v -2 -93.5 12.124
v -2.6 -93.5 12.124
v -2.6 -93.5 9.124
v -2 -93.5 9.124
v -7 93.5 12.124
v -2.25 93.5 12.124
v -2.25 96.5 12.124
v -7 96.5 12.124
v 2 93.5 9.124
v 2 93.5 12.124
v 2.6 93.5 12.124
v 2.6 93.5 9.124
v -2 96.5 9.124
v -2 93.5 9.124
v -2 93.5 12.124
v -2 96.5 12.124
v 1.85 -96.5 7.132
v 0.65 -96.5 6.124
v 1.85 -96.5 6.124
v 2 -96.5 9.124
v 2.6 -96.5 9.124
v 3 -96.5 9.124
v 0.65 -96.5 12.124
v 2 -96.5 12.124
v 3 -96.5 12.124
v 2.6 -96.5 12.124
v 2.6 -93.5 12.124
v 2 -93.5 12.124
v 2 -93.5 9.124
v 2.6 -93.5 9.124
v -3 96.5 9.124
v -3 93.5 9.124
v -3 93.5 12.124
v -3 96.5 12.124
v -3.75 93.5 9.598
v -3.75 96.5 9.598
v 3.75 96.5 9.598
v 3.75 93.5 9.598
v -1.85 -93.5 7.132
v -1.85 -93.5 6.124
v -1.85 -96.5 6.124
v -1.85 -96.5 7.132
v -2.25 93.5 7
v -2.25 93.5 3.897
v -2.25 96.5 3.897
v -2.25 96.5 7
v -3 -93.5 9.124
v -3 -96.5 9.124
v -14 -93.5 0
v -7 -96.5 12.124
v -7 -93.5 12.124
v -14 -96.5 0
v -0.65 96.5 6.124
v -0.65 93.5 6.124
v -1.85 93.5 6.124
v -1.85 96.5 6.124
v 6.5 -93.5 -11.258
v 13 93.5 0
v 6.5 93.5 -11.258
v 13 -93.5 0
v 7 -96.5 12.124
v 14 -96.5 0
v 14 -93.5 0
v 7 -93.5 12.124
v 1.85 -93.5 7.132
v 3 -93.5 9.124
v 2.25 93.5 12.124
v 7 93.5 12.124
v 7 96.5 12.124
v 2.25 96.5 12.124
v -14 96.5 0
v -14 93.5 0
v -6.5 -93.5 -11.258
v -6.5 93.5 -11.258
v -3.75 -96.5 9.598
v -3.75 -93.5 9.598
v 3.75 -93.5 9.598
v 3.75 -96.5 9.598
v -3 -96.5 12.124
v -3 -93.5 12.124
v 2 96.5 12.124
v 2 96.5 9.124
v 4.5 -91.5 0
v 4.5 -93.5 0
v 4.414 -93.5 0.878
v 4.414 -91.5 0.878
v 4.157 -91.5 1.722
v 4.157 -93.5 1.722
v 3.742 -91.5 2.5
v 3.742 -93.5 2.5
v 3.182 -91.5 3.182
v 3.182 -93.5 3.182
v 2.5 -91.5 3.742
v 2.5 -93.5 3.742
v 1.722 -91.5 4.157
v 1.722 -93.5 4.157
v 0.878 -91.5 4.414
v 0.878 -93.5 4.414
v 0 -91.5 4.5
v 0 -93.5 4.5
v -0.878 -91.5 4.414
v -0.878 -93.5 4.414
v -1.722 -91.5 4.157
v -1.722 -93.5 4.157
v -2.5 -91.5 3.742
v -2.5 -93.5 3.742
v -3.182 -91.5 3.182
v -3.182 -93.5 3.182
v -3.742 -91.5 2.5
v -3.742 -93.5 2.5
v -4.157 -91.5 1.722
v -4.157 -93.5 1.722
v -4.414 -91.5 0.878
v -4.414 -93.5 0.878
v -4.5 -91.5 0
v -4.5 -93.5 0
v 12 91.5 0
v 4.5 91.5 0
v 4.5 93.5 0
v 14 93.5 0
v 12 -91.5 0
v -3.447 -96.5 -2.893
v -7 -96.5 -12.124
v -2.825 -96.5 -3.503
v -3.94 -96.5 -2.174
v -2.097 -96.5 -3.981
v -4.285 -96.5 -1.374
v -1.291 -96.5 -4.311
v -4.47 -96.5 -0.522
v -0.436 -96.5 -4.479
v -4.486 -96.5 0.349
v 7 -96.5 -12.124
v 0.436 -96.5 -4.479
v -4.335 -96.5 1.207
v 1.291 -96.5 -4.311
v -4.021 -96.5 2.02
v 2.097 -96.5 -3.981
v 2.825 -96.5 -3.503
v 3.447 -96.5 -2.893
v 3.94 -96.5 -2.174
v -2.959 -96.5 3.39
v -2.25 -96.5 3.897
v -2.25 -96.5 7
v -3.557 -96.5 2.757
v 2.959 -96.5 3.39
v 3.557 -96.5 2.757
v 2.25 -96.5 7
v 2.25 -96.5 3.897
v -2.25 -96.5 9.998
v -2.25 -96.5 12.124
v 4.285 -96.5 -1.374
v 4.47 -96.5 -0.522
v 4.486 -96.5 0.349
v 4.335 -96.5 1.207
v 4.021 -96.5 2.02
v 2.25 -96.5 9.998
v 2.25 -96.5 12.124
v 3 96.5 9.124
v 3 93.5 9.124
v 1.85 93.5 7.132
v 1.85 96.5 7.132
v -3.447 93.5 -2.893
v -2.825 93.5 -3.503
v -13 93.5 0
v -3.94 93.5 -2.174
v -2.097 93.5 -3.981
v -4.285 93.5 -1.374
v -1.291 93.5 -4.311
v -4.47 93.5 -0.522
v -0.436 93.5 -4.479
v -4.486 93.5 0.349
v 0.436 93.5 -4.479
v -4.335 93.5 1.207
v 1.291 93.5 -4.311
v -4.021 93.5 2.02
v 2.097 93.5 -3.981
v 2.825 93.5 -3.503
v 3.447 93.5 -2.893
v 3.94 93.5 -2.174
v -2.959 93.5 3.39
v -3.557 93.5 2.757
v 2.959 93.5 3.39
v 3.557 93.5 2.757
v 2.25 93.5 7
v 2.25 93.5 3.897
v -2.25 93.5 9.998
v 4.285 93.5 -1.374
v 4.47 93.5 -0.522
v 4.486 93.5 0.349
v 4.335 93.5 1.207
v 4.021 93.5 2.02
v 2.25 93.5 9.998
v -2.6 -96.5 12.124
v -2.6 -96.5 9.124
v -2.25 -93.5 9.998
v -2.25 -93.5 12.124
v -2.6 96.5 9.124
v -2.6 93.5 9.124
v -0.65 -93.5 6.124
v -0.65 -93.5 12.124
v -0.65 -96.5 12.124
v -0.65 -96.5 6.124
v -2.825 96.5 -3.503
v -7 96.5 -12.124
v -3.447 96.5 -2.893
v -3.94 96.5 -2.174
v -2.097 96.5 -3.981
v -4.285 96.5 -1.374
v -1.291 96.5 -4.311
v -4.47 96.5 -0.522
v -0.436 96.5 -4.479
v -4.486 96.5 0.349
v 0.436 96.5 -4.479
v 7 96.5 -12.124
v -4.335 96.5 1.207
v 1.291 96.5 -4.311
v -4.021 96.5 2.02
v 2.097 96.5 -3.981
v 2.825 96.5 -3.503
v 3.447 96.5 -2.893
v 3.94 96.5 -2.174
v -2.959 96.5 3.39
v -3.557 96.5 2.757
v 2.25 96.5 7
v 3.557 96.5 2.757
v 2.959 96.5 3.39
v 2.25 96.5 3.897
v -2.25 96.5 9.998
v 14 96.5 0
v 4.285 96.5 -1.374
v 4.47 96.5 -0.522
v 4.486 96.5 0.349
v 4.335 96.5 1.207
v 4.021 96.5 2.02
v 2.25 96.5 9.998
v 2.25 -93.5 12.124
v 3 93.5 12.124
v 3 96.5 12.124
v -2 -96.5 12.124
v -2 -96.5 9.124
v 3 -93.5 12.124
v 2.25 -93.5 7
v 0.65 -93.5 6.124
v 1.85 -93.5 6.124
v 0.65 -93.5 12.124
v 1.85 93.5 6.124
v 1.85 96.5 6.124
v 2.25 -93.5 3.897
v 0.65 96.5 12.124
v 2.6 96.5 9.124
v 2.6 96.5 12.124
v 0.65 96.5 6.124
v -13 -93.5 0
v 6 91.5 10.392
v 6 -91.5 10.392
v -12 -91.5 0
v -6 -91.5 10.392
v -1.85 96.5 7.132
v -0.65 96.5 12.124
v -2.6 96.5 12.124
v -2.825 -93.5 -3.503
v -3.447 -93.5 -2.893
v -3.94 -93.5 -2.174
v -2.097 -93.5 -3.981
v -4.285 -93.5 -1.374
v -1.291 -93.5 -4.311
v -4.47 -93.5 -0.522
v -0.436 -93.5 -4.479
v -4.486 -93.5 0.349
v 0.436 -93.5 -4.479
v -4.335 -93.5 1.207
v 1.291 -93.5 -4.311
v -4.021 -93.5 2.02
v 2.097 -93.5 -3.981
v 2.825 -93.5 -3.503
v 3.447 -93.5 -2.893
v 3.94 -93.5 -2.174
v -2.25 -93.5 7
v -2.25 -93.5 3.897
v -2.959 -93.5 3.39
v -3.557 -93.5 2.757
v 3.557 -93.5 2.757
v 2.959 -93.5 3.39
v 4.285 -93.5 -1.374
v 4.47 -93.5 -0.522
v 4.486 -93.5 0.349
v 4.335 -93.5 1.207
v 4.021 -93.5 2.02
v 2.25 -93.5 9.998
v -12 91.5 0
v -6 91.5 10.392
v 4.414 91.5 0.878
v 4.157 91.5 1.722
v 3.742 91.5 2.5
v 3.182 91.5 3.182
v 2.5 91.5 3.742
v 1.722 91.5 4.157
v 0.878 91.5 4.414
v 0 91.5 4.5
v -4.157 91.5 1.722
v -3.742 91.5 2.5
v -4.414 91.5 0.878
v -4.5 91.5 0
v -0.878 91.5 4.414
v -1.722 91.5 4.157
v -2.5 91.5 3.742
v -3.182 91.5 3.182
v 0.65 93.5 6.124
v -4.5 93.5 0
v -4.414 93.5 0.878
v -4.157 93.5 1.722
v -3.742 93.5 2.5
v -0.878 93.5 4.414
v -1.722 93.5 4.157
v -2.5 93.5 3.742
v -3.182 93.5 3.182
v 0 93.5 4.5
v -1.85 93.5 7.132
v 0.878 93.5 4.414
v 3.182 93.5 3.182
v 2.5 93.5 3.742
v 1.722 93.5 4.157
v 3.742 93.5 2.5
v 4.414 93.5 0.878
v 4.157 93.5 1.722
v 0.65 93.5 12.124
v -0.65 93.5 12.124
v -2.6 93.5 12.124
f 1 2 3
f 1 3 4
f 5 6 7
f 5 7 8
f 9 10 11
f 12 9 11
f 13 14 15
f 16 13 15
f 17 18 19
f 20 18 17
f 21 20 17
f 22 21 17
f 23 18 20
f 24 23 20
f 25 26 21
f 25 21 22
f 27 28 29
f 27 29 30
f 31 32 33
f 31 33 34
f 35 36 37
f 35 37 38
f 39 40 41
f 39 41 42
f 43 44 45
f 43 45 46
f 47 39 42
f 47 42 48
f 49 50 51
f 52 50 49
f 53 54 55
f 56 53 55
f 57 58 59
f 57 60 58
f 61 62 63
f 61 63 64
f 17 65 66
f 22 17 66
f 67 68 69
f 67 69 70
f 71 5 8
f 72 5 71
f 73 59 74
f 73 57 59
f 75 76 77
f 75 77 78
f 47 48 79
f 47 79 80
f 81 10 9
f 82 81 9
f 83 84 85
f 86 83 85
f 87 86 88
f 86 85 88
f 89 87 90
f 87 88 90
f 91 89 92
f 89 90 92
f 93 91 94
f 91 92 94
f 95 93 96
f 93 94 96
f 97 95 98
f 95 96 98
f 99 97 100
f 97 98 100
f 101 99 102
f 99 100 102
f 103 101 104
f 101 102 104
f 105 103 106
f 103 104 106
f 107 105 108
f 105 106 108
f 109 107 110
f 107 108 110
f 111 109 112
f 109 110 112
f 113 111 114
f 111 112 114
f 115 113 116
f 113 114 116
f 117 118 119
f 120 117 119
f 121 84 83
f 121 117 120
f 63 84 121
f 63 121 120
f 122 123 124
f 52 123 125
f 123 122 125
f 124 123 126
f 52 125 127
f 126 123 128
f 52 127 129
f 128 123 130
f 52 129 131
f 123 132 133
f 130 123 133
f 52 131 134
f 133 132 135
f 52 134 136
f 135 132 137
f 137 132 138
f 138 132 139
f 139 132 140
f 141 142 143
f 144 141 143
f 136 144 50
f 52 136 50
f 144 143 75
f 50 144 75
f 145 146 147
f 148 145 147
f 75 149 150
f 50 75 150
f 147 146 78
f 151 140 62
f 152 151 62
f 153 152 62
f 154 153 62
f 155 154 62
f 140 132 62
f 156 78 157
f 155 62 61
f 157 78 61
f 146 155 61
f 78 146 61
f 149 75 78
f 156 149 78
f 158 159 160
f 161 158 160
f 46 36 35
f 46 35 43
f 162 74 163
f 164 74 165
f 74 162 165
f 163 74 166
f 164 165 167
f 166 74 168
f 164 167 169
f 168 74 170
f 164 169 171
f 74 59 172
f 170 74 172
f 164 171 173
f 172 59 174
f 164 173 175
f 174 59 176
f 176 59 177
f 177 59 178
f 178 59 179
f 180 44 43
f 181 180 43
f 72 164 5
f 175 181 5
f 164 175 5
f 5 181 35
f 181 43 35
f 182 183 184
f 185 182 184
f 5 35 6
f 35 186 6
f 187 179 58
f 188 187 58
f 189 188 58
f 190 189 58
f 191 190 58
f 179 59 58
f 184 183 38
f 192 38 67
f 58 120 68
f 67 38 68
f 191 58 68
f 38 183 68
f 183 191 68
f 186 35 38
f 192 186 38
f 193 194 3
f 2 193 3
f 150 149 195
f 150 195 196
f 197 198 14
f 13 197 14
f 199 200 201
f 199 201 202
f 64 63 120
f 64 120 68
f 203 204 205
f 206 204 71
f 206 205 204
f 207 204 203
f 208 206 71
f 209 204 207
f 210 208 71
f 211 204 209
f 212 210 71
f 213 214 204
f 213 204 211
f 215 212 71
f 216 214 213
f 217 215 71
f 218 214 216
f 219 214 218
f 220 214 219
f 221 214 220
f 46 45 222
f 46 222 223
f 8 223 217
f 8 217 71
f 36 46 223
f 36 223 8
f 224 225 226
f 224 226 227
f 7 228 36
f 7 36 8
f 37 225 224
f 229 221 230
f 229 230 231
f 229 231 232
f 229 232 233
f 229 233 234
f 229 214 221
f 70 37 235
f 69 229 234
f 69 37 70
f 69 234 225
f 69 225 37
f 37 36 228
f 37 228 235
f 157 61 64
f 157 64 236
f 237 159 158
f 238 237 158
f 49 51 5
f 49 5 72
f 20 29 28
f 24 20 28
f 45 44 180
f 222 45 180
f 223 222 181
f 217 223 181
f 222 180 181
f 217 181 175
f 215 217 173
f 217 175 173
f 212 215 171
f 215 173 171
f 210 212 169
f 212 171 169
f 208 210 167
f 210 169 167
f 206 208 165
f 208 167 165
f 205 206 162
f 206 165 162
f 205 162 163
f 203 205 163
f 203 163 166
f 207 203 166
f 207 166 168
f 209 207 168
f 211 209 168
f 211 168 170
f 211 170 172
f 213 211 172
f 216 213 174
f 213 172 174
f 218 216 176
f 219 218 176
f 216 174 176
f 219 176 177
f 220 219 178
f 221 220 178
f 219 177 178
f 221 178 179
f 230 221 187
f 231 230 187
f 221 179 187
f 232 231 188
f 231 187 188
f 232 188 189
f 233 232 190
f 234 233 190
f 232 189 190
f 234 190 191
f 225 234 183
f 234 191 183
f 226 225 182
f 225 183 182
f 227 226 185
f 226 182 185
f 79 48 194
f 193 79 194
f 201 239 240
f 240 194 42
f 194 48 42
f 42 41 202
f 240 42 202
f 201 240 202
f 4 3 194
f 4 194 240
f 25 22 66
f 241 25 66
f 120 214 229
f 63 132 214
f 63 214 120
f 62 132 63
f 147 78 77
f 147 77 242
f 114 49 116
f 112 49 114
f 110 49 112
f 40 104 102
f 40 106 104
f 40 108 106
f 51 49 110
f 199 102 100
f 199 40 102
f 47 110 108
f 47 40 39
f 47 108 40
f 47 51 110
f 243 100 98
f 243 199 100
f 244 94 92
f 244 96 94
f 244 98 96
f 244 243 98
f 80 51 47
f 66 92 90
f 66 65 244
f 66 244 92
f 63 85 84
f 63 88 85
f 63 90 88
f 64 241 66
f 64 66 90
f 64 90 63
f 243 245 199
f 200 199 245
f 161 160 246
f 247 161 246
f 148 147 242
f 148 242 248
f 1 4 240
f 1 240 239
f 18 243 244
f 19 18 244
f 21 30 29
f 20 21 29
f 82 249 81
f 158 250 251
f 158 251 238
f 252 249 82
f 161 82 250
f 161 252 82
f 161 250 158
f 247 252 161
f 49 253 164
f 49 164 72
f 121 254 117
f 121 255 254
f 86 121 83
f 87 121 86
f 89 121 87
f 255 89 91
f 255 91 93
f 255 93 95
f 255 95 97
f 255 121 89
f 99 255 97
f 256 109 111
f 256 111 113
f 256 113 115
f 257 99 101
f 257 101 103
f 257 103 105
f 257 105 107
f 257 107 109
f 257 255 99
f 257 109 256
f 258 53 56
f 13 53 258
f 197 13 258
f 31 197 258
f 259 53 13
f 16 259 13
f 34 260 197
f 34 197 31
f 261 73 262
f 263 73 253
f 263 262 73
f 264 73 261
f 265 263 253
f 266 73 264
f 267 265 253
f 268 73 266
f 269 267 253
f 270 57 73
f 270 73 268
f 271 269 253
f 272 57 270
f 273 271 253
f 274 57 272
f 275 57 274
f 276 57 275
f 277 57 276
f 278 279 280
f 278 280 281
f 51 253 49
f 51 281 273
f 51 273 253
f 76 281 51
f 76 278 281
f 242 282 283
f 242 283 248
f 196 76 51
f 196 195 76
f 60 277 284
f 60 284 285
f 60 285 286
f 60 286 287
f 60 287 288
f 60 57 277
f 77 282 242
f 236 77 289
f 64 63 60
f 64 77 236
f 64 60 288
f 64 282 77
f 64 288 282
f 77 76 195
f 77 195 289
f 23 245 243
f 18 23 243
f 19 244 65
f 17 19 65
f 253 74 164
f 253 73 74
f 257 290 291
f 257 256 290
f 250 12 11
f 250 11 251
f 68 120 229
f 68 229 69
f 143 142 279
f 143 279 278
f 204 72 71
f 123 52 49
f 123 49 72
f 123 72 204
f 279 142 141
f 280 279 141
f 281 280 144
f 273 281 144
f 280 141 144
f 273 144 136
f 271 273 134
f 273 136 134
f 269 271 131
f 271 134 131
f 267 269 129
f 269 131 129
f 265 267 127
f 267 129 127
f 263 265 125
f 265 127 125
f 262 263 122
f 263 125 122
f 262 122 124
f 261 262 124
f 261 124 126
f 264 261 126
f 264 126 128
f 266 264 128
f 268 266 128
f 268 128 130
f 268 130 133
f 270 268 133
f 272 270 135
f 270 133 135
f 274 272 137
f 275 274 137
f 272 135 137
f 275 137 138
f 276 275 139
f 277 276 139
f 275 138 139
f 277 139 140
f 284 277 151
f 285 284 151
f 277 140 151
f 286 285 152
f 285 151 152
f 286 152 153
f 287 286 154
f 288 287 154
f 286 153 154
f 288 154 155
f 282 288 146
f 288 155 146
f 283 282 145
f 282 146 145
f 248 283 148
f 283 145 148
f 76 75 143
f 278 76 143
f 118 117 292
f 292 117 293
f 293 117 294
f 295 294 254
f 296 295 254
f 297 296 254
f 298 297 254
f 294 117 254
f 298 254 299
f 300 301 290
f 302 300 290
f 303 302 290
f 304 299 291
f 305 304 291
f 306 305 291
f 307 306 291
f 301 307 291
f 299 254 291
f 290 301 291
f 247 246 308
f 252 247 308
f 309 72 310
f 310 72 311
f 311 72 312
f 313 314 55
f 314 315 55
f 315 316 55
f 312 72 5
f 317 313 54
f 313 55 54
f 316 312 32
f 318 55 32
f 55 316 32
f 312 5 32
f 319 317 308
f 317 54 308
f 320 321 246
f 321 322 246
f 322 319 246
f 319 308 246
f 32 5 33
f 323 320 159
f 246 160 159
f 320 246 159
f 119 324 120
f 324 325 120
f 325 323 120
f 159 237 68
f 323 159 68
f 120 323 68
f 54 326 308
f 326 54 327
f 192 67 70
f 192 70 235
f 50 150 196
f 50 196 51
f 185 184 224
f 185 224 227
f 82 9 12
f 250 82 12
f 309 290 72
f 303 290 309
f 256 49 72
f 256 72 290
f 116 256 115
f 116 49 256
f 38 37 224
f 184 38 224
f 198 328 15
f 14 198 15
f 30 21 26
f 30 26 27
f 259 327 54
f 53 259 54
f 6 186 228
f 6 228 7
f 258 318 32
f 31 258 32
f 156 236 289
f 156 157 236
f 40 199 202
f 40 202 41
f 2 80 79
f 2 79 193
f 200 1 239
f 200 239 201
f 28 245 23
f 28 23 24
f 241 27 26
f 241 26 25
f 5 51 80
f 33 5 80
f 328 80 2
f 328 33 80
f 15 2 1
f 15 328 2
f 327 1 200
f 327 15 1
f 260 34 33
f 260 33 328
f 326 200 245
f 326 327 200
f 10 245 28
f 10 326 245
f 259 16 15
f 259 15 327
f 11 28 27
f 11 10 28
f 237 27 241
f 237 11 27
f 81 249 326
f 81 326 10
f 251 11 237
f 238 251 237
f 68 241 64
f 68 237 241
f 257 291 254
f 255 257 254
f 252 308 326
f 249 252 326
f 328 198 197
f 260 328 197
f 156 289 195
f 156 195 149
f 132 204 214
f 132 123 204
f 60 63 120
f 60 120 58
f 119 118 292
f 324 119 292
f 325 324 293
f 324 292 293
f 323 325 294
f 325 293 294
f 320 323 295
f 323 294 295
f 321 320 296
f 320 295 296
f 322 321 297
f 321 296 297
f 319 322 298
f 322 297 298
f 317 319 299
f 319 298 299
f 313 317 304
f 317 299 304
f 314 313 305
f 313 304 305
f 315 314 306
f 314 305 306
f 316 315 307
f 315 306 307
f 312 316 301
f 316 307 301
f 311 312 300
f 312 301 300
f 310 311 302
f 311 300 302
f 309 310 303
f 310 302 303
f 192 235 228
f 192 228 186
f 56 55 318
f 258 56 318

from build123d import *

# Parameters (mm, degrees)
PAD002_DEPTH      = 100
PAD001_DEPTH      = 93.5
PAD_DEPTH         = 96.5
SKETCH010_W       = 3
SKETCH010_H       = 0.4
PAD008_DEPTH      = 5
SKETCH011_W       = 3
SKETCH011_H       = 0.4
PAD009_DEPTH      = 5
SKETCH005_W       = 62
SKETCH005_H       = 32
PAD005_DEPTH      = 100
PAD004_DEPTH      = 91.5
PAD003_DEPTH      = 93.5
SKETCH006_R       = 4.5
POCKET_DEPTH      = 187.001
POCKET_DEPTH_BACK = -0.001
PAD006_DEPTH      = 3
PAD007_DEPTH      = 3
SKETCH012_W       = 0.4
SKETCH012_H       = 3
PAD010_DEPTH      = 3
SKETCH013_W       = 0.4
SKETCH013_H       = 3
PAD011_DEPTH      = 3


with BuildPart() as pad002:
    # Sketch002 → Pad002 (new body, symmetric)
    with BuildSketch(Plane.XZ):
        with BuildLine():
            Line((2.25, 7), (2.25, 3.897114))
            ThreePointArc((-2.25, 3.897114), (0, -4.5), (2.25, 3.897114))
            Line((-2.25, 3.897114), (-2.25, 7))
            Line((-3.75, 9.598076), (-2.25, 7))
            Line((-2.25, 9.598076), (-3.75, 9.598076))
            Line((-2.25, 9.598076), (-2.25, 24.598076))
            Line((-2.25, 24.598076), (2.25, 24.598076))
            Line((2.25, 24.598076), (2.25, 9.598076))
            Line((2.25, 9.598076), (3.75, 9.598076))
            Line((3.75, 9.598076), (2.25, 7))
        make_face()
    extrude(amount=PAD002_DEPTH, both=True)


with BuildPart() as pad001:
    # Sketch001 → Pad001 (new body, symmetric)
    with BuildSketch(Plane.XZ):
        Polygon((-19.8481, 20), (19.8481, 20), (19.8481, 0), (13, 0), (6.5, -11.25833), (-6.5, -11.25833), (-13, 0), (-19.8481, 0), align=None)
    extrude(amount=PAD001_DEPTH, both=True)


with BuildPart() as cajs:
    # Sketch → Pad (new body, symmetric)
    with BuildSketch(Plane.XZ):
        Polygon((7, -12.124356), (14, 0), (7, 12.124356), (-7, 12.124356), (-14, 0), (-7, -12.124356), align=None)
    extrude(amount=PAD_DEPTH, both=True)

    # Cut: cut Pad001
    add(pad001.part, mode=Mode.SUBTRACT)

    # Cut001: cut Pad002
    add(pad002.part, mode=Mode.SUBTRACT)

    # Sketch010 → Pad008 (new body)
    with BuildSketch(Plane(origin=(2.25, 0, 0), x_dir=(0, -1, 0), z_dir=(-1, 0, 0))):
        with Locations((95, 9.798076)):
            Rectangle(SKETCH010_W, SKETCH010_H)
    extrude(amount=PAD008_DEPTH)

    # Sketch011 → Pad009 (new body)
    with BuildSketch(Plane(origin=(2.25, 0, 0), x_dir=(0, -1, 0), z_dir=(-1, 0, 0))):
        with Locations((-95, 9.798076)):
            Rectangle(SKETCH011_W, SKETCH011_H)
    extrude(amount=PAD009_DEPTH)


with BuildPart() as pad005:
    # Sketch005 → Pad005 (new body, symmetric)
    with BuildSketch(Plane.XZ):
        with Locations((0, -16)):
            Rectangle(SKETCH005_W, SKETCH005_H)
    extrude(amount=PAD005_DEPTH, both=True)


with BuildPart() as pad004:
    # Sketch004 → Pad004 (new body, symmetric)
    with BuildSketch(Plane.XZ):
        Polygon((-31.5, 0), (-12, 0), (-6, 10.392305), (6, 10.392305), (12, 0), (31.5, 0), (31.5, -32), (-31.5, -32), align=None)
    extrude(amount=PAD004_DEPTH, both=True)


with BuildPart() as tapa2:
    # Sketch003 → Pad003 (new body, symmetric)
    with BuildSketch(Plane.XZ):
        Polygon((7, -12.124356), (14, 0), (7, 12.124356), (-7, 12.124356), (-14, 0), (-7, -12.124356), align=None)
    extrude(amount=PAD003_DEPTH, both=True)

    # Cut002: cut Pad004
    add(pad004.part, mode=Mode.SUBTRACT)

    # Cut003: cut Pad005
    add(pad005.part, mode=Mode.SUBTRACT)

    # Sketch006 → Pocket (cut, two sides)
    with BuildSketch(Plane.XZ.offset(93.5)) as pocket_sk:
        Circle(SKETCH006_R)
    extrude(amount=-POCKET_DEPTH, mode=Mode.SUBTRACT)
    extrude(pocket_sk.sketch, amount=-POCKET_DEPTH_BACK, mode=Mode.SUBTRACT)

    # Sketch008 → Pad006 (new body)
    with BuildSketch(Plane(origin=(0, 93.5, 0), x_dir=(-1, 0, 0), z_dir=(0, 1, 0))):
        Polygon((-2, 12.124356), (-2, 9.124356), (-3, 9.124356), (-1.85, 7.132497), (-1.85, 6.124356), (-0.65, 6.124356), (-0.65, 12.124356), align=None)
        Polygon((0.65, 12.124356), (0.65, 6.124356), (1.85, 6.124356), (1.85, 7.132497), (3, 9.124356), (2, 9.124356), (2, 12.124356), align=None)
    extrude(amount=PAD006_DEPTH)

    # Sketch009 → Pad007 (new body)
    with BuildSketch(Plane.XZ.offset(93.5)):
        Polygon((0.65, 12.124356), (0.65, 6.124356), (1.85, 6.124356), (1.85, 7.132497), (3, 9.124356), (2, 9.124356), (2, 12.124356), align=None)
        Polygon((-2, 12.124356), (-0.65, 12.124356), (-0.65, 6.124356), (-1.85, 6.124356), (-1.85, 7.132497), (-3, 9.124356), (-2, 9.124356), align=None)
    extrude(amount=PAD007_DEPTH)

    # Sketch012 → Pad010 (new body)
    with BuildSketch(Plane.XY.offset(9.124356)):
        with Locations((-2.8, -95)):
            Rectangle(SKETCH012_W, SKETCH012_H)
        with Locations((2.8, -95)):
            Rectangle(SKETCH012_W, SKETCH012_H)
    extrude(amount=PAD010_DEPTH)

    # Sketch013 → Pad011 (new body)
    with BuildSketch(Plane.XY.offset(9.124356)):
        with Locations((2.8, 95)):
            Rectangle(SKETCH013_W, SKETCH013_H)
        with Locations((-2.8, 95)):
            Rectangle(SKETCH013_W, SKETCH013_H)
    extrude(amount=PAD011_DEPTH)


solid = Compound([cajs.part, tapa2.part])
